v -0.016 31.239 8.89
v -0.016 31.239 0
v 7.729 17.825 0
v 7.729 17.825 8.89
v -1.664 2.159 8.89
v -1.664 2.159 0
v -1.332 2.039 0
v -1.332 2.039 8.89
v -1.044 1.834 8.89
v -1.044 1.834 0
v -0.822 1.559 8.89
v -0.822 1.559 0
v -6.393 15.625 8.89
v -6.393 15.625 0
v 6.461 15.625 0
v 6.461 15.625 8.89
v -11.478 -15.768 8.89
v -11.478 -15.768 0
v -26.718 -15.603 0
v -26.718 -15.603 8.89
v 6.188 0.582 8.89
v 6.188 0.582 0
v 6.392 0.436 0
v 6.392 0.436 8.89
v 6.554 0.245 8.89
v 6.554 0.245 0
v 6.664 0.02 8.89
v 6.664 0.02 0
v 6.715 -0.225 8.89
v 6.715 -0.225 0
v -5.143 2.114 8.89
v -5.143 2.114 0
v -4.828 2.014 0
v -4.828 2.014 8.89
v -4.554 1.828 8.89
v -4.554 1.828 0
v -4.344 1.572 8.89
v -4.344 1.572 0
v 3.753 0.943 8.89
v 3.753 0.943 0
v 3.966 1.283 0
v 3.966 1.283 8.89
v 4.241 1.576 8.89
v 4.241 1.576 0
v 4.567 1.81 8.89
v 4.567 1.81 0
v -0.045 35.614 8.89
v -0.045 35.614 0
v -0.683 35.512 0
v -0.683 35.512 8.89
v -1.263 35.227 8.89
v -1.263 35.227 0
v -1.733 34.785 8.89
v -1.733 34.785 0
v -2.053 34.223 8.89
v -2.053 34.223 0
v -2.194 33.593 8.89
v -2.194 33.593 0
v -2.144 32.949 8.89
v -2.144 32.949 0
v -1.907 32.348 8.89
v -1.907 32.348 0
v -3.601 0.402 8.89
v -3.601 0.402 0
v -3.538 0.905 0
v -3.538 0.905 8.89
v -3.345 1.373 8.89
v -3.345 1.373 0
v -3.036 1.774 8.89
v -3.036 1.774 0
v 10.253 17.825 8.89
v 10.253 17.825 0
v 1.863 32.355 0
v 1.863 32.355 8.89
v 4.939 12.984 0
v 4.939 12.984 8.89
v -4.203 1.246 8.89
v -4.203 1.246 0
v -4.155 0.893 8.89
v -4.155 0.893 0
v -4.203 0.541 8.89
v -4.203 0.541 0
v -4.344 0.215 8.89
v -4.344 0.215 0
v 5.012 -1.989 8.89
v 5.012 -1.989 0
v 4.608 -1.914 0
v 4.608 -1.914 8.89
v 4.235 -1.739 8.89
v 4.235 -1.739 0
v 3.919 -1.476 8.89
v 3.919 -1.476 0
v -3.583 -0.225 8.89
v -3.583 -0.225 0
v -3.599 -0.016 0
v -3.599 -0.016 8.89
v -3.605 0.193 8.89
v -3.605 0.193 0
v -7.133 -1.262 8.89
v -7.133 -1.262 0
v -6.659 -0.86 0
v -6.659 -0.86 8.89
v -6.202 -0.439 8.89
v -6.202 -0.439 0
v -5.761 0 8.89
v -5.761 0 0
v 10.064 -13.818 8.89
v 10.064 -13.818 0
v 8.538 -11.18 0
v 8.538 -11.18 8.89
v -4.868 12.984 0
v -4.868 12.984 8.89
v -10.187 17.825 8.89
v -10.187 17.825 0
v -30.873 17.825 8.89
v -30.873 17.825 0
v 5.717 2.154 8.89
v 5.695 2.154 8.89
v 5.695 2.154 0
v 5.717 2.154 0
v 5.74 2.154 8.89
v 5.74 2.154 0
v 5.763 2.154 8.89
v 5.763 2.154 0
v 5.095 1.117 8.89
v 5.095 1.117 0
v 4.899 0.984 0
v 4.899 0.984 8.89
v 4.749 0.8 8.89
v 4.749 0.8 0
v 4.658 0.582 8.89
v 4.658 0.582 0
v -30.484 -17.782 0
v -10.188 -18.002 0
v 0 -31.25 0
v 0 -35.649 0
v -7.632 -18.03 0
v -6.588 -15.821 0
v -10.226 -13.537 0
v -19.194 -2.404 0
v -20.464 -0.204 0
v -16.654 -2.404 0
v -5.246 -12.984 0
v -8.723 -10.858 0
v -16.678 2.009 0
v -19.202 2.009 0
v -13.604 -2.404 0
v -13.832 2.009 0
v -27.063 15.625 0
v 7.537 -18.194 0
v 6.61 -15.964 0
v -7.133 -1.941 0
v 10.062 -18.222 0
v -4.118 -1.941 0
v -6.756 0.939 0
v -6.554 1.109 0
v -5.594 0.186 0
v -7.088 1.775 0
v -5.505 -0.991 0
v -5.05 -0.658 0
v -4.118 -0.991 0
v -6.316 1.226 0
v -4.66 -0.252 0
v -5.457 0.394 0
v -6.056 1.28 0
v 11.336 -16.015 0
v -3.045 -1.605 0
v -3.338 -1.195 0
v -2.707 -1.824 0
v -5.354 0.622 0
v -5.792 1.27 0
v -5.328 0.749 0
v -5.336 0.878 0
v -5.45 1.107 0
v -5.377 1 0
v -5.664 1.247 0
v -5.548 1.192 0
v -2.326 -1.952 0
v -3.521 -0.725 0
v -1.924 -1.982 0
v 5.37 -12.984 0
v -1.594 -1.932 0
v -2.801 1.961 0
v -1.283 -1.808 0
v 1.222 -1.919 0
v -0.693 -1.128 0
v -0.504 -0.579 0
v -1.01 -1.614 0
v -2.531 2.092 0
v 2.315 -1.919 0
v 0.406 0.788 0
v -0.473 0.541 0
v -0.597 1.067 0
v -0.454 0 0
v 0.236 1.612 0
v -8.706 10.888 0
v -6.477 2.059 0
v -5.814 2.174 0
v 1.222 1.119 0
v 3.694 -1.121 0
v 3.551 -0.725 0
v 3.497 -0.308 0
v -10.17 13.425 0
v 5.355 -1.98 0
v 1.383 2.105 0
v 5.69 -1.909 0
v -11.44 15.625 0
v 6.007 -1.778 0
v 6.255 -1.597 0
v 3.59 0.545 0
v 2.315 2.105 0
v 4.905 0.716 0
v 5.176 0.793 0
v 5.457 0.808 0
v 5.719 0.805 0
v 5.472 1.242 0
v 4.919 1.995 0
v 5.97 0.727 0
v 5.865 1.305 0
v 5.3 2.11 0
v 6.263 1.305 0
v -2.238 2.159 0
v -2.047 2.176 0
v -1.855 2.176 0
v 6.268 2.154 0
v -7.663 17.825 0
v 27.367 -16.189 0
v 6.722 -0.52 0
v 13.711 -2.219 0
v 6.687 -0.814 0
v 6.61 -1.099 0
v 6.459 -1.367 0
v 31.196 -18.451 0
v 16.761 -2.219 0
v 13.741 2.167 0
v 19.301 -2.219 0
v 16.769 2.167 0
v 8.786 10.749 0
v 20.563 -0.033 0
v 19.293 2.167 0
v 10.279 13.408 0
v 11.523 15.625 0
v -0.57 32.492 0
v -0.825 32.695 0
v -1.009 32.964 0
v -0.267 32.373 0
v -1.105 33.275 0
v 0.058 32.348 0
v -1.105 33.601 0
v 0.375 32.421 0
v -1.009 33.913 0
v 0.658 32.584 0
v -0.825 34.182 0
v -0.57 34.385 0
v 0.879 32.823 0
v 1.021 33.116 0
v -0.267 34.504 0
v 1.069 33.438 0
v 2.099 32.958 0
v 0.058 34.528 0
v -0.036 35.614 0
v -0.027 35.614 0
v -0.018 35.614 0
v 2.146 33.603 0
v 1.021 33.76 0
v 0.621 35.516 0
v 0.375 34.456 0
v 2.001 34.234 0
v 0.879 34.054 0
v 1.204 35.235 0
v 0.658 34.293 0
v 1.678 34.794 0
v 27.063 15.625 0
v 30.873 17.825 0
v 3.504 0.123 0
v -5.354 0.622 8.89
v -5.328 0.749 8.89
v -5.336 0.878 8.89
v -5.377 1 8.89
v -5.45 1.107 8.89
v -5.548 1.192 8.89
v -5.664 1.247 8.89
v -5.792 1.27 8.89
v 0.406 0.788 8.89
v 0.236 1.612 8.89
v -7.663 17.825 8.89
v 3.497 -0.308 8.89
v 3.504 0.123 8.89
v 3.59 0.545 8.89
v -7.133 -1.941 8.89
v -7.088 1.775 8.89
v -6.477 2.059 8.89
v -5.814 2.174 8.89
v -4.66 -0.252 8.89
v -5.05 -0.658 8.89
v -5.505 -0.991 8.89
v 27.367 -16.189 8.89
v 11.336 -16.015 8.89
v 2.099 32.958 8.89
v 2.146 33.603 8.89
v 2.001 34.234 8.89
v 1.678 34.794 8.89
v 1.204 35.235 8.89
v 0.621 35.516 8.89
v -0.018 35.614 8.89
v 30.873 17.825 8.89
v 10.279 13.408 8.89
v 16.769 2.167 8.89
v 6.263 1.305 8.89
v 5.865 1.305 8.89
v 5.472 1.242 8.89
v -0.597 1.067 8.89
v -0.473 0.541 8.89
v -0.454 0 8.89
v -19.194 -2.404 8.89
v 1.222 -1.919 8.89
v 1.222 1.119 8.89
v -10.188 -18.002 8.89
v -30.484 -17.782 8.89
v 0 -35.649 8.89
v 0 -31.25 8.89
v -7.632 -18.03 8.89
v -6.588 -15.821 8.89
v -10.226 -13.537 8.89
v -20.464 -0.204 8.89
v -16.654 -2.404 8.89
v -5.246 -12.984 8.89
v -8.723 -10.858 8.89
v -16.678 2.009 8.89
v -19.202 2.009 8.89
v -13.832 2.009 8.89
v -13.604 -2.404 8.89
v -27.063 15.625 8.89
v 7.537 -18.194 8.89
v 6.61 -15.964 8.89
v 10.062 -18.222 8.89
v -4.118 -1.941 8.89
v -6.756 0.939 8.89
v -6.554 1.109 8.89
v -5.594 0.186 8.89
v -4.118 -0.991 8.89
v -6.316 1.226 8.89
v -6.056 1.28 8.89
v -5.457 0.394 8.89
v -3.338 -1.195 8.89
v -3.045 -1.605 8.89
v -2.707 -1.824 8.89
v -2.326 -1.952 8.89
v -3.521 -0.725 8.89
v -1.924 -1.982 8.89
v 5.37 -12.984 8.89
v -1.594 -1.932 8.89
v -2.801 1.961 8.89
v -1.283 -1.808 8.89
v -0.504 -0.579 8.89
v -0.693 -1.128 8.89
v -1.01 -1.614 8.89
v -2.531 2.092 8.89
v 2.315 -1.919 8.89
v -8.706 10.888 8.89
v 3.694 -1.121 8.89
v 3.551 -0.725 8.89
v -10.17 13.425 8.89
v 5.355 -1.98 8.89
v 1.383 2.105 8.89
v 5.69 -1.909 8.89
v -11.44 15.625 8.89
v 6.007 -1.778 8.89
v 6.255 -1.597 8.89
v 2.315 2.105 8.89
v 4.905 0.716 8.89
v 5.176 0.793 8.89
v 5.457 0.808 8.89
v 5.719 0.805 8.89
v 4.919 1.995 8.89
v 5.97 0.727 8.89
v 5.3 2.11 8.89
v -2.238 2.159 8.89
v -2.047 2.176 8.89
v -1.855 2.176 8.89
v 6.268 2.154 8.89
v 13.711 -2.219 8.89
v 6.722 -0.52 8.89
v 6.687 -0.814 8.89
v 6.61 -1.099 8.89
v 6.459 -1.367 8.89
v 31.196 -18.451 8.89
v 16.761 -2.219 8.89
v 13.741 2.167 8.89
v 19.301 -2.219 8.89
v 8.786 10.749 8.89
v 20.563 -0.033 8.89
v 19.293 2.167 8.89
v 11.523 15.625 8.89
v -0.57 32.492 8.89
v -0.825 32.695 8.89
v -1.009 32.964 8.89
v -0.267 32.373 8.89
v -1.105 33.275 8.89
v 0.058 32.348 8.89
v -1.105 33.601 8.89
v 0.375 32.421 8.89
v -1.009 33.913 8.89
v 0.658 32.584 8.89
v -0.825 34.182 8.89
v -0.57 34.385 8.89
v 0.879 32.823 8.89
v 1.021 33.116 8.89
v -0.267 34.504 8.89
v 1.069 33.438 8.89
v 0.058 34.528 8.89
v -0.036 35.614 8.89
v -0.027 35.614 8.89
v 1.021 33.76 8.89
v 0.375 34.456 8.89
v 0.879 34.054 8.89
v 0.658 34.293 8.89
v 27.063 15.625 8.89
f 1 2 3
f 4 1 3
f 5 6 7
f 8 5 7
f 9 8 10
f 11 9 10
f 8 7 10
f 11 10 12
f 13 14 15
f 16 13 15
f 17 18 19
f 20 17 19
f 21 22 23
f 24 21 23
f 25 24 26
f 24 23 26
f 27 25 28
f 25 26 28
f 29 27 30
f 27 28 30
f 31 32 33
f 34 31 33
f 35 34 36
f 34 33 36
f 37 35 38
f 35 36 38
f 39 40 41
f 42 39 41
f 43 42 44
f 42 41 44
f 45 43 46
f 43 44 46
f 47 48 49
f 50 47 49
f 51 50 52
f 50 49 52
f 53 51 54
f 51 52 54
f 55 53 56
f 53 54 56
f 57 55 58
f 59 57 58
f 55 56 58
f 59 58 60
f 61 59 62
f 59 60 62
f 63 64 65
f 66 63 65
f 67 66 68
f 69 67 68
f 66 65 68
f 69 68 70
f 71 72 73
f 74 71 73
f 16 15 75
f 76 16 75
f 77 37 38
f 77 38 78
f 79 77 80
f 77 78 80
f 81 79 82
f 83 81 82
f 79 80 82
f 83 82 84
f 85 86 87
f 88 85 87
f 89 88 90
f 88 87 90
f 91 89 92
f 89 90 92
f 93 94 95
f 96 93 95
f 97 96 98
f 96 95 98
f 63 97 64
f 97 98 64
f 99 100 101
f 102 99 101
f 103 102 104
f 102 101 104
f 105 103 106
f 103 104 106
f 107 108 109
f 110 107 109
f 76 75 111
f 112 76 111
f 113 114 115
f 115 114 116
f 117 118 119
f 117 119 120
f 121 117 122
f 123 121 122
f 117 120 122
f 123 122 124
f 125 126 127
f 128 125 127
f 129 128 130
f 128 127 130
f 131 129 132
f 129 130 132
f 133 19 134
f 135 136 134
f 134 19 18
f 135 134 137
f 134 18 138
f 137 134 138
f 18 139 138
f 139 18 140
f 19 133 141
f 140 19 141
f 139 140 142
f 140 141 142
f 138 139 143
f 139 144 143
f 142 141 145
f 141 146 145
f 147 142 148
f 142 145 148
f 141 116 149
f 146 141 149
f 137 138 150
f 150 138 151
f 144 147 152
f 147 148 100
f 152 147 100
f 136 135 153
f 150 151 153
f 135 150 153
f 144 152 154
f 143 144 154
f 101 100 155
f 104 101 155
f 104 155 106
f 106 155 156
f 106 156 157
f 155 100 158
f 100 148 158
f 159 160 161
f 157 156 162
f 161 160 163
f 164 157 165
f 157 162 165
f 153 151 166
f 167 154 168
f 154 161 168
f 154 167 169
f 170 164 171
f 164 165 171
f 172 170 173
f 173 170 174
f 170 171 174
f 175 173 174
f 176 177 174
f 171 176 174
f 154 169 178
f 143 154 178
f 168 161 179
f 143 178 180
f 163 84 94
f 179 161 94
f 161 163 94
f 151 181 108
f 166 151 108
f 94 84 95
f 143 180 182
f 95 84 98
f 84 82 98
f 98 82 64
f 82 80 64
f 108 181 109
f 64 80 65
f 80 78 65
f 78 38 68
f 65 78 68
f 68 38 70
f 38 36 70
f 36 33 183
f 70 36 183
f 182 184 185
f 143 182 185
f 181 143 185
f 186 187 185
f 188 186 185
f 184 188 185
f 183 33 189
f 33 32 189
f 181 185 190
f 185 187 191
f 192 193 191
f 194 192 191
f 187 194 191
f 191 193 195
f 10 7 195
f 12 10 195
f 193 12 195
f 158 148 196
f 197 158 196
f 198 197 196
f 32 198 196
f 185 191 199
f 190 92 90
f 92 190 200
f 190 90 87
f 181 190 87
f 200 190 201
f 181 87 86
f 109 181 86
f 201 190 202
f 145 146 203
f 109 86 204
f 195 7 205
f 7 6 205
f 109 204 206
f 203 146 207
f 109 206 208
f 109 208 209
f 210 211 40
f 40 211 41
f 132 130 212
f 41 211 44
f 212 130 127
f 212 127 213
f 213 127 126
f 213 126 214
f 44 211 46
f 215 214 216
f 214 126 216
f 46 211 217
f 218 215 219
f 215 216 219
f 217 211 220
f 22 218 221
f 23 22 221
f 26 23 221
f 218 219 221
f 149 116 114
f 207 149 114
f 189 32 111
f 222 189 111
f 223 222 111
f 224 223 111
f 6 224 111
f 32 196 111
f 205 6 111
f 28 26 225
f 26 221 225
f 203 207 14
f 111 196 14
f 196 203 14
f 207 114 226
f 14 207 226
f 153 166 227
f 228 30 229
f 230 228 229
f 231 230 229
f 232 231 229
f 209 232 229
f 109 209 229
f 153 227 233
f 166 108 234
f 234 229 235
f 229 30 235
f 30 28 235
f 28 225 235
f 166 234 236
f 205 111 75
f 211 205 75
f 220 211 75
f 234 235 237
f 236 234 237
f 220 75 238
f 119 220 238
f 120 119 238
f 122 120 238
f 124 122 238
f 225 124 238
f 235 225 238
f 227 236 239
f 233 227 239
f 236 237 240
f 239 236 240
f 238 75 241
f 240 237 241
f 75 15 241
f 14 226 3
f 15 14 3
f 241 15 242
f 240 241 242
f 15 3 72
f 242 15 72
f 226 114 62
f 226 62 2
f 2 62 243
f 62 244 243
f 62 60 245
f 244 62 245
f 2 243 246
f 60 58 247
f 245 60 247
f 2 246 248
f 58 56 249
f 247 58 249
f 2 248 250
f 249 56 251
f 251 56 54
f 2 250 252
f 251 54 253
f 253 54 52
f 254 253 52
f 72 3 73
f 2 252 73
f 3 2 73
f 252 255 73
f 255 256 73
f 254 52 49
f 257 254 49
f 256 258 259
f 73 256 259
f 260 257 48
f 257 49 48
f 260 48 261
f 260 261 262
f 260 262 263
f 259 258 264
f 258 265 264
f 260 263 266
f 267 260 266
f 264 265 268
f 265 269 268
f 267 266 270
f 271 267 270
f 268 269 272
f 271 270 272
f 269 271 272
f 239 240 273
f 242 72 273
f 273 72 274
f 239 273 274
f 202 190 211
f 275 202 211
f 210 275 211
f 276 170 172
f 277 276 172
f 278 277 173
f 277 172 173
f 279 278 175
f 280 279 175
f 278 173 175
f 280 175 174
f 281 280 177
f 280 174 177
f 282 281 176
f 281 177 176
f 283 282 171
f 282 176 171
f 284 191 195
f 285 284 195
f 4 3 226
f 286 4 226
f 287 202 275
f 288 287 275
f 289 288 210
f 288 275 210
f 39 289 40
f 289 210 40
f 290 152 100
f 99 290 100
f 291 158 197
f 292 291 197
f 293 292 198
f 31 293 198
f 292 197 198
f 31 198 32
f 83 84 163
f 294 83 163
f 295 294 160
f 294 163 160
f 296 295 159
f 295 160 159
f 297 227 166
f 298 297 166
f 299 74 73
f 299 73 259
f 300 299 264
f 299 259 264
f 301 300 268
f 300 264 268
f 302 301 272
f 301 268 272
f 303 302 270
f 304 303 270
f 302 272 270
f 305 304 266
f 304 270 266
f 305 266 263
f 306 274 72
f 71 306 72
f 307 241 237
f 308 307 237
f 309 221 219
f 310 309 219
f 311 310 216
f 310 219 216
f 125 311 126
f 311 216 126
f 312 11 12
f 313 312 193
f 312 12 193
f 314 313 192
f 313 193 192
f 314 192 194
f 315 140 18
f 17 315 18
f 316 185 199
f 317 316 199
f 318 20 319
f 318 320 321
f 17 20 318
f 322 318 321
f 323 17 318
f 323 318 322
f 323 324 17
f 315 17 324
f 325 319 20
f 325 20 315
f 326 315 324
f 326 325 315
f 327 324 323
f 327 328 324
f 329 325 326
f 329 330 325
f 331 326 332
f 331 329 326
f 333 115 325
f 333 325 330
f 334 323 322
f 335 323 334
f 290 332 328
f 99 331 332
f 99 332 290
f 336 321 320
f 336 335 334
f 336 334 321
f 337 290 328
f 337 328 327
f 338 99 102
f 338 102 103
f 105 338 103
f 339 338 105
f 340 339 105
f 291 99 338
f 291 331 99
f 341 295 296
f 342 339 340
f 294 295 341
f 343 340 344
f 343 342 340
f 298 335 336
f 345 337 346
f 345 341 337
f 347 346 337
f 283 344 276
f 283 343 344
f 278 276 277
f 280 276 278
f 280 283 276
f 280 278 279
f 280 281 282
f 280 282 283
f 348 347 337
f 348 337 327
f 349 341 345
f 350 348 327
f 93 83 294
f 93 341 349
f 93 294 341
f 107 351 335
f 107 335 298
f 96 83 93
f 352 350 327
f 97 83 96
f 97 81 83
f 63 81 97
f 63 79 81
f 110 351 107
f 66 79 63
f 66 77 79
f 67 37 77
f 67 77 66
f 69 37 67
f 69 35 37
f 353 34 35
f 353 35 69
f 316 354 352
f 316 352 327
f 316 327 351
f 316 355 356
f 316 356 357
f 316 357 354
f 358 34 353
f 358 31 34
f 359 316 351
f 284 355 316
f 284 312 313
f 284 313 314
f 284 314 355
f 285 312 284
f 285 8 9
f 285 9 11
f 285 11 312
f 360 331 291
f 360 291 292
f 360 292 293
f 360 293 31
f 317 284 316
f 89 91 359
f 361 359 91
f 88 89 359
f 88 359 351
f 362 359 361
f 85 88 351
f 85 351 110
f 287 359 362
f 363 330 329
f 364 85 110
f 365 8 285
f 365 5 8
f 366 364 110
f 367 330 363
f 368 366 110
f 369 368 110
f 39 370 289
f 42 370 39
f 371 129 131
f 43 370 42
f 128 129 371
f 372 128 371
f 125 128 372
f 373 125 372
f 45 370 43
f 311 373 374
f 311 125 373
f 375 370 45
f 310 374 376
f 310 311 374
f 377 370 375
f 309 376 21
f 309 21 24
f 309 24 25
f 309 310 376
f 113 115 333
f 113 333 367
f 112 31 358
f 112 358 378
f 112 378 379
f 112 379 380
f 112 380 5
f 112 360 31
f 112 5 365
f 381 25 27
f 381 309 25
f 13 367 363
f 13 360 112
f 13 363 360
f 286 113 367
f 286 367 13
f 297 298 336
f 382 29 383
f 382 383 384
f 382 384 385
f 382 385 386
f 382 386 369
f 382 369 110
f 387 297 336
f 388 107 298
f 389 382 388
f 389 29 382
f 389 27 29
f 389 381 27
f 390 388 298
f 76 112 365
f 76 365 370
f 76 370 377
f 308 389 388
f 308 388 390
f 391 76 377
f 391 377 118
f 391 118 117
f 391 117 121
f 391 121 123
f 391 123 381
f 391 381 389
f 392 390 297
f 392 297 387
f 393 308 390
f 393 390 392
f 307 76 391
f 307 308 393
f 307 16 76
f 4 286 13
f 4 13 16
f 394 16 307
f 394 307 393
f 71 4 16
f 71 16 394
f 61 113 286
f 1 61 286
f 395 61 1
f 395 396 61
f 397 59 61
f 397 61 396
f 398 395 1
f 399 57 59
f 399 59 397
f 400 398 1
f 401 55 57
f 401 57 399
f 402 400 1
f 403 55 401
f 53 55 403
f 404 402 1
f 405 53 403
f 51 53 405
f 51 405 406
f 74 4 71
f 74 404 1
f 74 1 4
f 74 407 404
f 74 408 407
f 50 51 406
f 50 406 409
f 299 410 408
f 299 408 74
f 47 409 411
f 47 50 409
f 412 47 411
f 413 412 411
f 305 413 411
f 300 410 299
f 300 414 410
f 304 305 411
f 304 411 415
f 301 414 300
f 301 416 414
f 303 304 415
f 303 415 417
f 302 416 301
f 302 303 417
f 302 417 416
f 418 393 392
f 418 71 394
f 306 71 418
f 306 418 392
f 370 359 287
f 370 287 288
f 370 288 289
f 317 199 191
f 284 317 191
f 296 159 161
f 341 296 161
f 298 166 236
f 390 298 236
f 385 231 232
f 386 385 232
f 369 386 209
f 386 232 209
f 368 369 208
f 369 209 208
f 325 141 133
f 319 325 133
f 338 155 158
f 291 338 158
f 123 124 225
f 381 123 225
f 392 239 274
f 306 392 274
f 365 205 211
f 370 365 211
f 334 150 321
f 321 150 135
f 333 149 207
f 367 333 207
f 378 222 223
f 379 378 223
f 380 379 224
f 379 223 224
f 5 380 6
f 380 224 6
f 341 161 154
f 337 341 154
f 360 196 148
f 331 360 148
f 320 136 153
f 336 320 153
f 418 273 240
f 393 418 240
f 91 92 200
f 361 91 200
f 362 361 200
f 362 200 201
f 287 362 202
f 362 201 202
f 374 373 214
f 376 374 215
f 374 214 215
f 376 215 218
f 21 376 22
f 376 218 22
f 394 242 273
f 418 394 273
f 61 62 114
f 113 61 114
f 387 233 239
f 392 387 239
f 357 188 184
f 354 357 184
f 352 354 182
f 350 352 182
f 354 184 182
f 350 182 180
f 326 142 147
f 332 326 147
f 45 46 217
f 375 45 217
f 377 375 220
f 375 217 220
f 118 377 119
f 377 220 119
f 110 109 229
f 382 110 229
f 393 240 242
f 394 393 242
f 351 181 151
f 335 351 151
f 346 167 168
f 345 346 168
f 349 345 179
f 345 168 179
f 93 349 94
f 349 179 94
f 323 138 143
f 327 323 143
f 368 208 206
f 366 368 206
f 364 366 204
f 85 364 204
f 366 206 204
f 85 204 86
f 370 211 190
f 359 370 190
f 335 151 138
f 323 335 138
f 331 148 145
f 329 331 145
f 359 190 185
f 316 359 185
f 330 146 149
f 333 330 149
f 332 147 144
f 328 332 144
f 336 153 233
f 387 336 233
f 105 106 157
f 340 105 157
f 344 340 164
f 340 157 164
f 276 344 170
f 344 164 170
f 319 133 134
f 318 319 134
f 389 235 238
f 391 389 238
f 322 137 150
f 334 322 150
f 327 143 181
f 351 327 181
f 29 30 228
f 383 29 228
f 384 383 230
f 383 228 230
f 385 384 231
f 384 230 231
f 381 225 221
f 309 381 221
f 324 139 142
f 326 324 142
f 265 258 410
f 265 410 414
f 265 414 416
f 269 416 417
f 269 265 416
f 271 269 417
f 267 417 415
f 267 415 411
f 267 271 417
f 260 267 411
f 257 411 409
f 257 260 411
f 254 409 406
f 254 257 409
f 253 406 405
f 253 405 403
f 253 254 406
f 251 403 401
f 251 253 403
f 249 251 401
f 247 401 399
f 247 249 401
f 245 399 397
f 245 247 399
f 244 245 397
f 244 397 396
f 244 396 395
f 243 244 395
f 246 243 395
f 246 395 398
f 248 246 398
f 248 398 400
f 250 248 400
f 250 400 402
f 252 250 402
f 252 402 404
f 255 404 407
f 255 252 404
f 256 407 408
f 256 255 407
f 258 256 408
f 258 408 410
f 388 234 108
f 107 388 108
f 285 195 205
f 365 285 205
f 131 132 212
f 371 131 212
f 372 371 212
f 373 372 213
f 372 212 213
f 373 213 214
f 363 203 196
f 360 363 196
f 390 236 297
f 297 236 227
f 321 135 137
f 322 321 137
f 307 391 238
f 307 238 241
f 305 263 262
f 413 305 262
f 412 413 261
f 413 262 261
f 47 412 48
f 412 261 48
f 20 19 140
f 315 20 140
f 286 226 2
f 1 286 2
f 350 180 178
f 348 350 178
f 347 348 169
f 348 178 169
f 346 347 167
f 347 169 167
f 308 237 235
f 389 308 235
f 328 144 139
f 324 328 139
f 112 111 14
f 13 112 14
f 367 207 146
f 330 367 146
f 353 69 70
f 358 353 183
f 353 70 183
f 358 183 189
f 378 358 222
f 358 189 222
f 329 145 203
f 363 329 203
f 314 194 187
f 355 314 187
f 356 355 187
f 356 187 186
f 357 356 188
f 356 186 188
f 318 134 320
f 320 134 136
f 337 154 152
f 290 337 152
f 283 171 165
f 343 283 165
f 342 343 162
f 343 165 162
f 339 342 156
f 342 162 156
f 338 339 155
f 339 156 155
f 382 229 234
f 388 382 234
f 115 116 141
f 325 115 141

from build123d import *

# Parameters (mm, degrees)
F0_R     = 1.092901
F1_DEPTH = 8.89


with BuildPart() as f1:
    # F0 (on Top) → F1 (new body)
    with BuildSketch(Plane.XY):
        with BuildLine():
            Line((-10.186511, 17.824513), (-30.872961, 17.824513))
            Line((-30.872961, 17.824513), (-20.463953, -0.204419))
            Line((-20.463953, -0.204419), (-30.484094, -17.781989))
            Line((-30.484094, -17.781989), (-10.188458, -18.002097))
            Line((-10.188458, -18.002097), (0, -35.649025))
            Line((0, -35.649025), (10.061664, -18.221712))
            Line((10.061664, -18.221712), (31.196423, -18.450921))
            Line((31.196423, -18.450921), (20.562876, -0.033079))
            Line((20.562876, -0.033079), (30.872961, 17.824513))
            Line((30.872961, 17.824513), (10.252791, 17.824513))
            Line((10.252791, 17.824513), (1.863466, 32.35525))
            ThreePointArc((1.863466, 32.35525), (1.860641, 34.526342), (-0.018168, 35.614335))
            ThreePointArc((-0.018168, 35.614335), (-0.0318, 35.614328), (-0.045431, 35.614235))
            ThreePointArc((-0.045431, 35.614235), (-1.914248, 34.515979), (-1.907155, 32.348355))
            Line((-1.907155, 32.348355), (-10.186511, 17.824513))
        make_face()
        Polygon((-7.632454, -18.029818), (7.537469, -18.194337), (0, -31.249616), align=None, mode=Mode.SUBTRACT)
        Polygon((-11.478418, -15.767821), (-26.717751, -15.602549), (-19.193953, -2.404124), align=None, mode=Mode.SUBTRACT)
        Polygon((6.609826, -15.96399), (-6.587783, -15.820861), (-5.245977, -12.983611), (5.37023, -12.983611), align=None, mode=Mode.SUBTRACT)
        Polygon((-10.226373, -13.537018), (-16.653953, -2.404124), (-13.604161, -2.404124), (-8.723036, -10.85848), align=None, mode=Mode.SUBTRACT)
        Polygon((13.711111, -2.218881), (16.760902, -2.218881), (10.064189, -13.817929), (8.537635, -11.179605), align=None, mode=Mode.SUBTRACT)
        Polygon((11.33557, -16.015242), (19.300902, -2.218881), (27.366612, -16.1891), align=None, mode=Mode.SUBTRACT)
        Polygon((-19.20203, 2.009275), (-27.062961, 15.624808), (-11.440459, 15.624808), align=None, mode=Mode.SUBTRACT)
        Polygon((-13.832127, 2.009275), (-16.678082, 2.009275), (-10.170459, 13.425103), (-8.705827, 10.888287), align=None, mode=Mode.SUBTRACT)
        with BuildLine():
            Line((-6.75627, 0.938559), (-7.088266, 1.774853))
            ThreePointArc((-7.088266, 1.774853), (-6.149591, 2.138201), (-5.143329, 2.114348))
            ThreePointArc((-5.143329, 2.114348), (-4.684085, 1.931017), (-4.344395, 1.571676))
            ThreePointArc((-4.344395, 1.571676), (-4.154791, 0.893336), (-4.344395, 0.214996))
            ThreePointArc((-4.344395, 0.214996), (-4.846257, -0.463524), (-5.50511, -0.990941))
            Line((-5.50511, -0.990941), (-4.118282, -0.990941))
            Line((-4.118282, -0.990941), (-4.118282, -1.940617))
            Line((-4.118282, -1.940617), (-7.133126, -1.940617))
            Line((-7.133126, -1.940617), (-7.133126, -1.262277))
            ThreePointArc((-7.133126, -1.262277), (-6.428669, -0.65133), (-5.761372, 0))
            ThreePointArc((-5.761372, 0), (-5.521749, 0.287364), (-5.354368, 0.622))
            ThreePointArc((-5.354368, 0.622), (-5.409921, 1.056041), (-5.79152, 1.270191))
            ThreePointArc((-5.79152, 1.270191), (-6.315562, 1.225589), (-6.75627, 0.938559))
        make_face(mode=Mode.SUBTRACT)
        with BuildLine():
            ThreePointArc((-3.600539, 0.402436), (-3.456783, 1.145183), (-3.035859, 1.773803))
            ThreePointArc((-3.035859, 1.773803), (-2.669777, 2.034358), (-2.238135, 2.159219))
            ThreePointArc((-2.238135, 2.159219), (-1.951313, 2.178043), (-1.664491, 2.159219))
            ThreePointArc((-1.664491, 2.159219), (-1.180923, 1.946357), (-0.821952, 1.558686))
            ThreePointArc((-0.821952, 1.558686), (-0.52188, 0.80677), (-0.454462, 0))
            ThreePointArc((-0.454462, 0), (-0.581823, -0.858949), (-1.010179, -1.614281))
            ThreePointArc((-1.010179, -1.614281), (-1.43468, -1.87918), (-1.924424, -1.981771))
            ThreePointArc((-1.924424, -1.981771), (-2.520232, -1.899523), (-3.044822, -1.605318))
            ThreePointArc((-3.044822, -1.605318), (-3.443663, -0.96578), (-3.582613, -0.224987))
            ThreePointArc((-3.582613, -0.224987), (-3.602765, 0.088404), (-3.600539, 0.402436))
        make_face(mode=Mode.SUBTRACT)
        Polygon((-4.867668, 12.983611), (-6.392563, 15.624808), (6.461138, 15.624808), (4.938996, 12.983611), align=None, mode=Mode.SUBTRACT)
        Polygon((-7.662563, 17.824513), (-0.015805, 31.238637), (7.728844, 17.824513), align=None, mode=Mode.SUBTRACT)
        with Locations((-0.023831, 33.438342)):
            Circle(F0_R, mode=Mode.SUBTRACT)
        Polygon((0.406004, 0.787853), (0.235703, 1.612465), (1.382991, 2.10544), (2.315162, 2.10544), (2.315162, -1.919029), (1.221654, -1.919029), (1.221654, 1.11949), align=None, mode=Mode.SUBTRACT)
        with BuildLine():
            ThreePointArc((6.263092, 1.305151), (5.667589, 1.281478), (5.09484, 1.116724))
            ThreePointArc((5.09484, 1.116724), (4.817232, 0.89738), (4.657688, 0.581589))
            ThreePointArc((4.657688, 0.581589), (5.038025, 0.762238), (5.456621, 0.807702))
            ThreePointArc((5.456621, 0.807702), (5.84702, 0.774991), (6.187721, 0.581589))
            ThreePointArc((6.187721, 0.581589), (6.553589, 0.245128), (6.715319, -0.224882))
            ThreePointArc((6.715319, -0.224882), (6.710022, -0.667762), (6.609799, -1.099186))
            ThreePointArc((6.609799, -1.099186), (6.363355, -1.487281), (6.00683, -1.777526))
            ThreePointArc((6.00683, -1.777526), (5.523997, -1.951951), (5.011932, -1.988565))
            ThreePointArc((5.011932, -1.988565), (4.415764, -1.838341), (3.919051, -1.476042))
            ThreePointArc((3.919051, -1.476042), (3.611747, -0.926696), (3.496973, -0.30779))
            ThreePointArc((3.496973, -0.30779), (3.537223, 0.33579), (3.753235, 0.94337))
            ThreePointArc((3.753235, 0.94337), (4.096734, 1.436393), (4.567243, 1.810138))
            ThreePointArc((4.567243, 1.810138), (5.106743, 2.061392), (5.694663, 2.153803))
            ThreePointArc((5.694663, 2.153803), (5.728652, 2.154074), (5.762642, 2.153803))
            Line((5.762642, 2.153803), (6.268268, 2.153803))
            Line((6.268268, 2.153803), (6.263092, 1.305151))
        make_face(mode=Mode.SUBTRACT)
        Polygon((8.786237, 10.749013), (10.278659, 13.408103), (16.768929, 2.166626), (13.74128, 2.166626), align=None, mode=Mode.SUBTRACT)
        Polygon((11.522791, 15.624808), (27.062961, 15.624808), (19.292876, 2.166626), align=None, mode=Mode.SUBTRACT)
    extrude(amount=F1_DEPTH)


solid = f1.part
